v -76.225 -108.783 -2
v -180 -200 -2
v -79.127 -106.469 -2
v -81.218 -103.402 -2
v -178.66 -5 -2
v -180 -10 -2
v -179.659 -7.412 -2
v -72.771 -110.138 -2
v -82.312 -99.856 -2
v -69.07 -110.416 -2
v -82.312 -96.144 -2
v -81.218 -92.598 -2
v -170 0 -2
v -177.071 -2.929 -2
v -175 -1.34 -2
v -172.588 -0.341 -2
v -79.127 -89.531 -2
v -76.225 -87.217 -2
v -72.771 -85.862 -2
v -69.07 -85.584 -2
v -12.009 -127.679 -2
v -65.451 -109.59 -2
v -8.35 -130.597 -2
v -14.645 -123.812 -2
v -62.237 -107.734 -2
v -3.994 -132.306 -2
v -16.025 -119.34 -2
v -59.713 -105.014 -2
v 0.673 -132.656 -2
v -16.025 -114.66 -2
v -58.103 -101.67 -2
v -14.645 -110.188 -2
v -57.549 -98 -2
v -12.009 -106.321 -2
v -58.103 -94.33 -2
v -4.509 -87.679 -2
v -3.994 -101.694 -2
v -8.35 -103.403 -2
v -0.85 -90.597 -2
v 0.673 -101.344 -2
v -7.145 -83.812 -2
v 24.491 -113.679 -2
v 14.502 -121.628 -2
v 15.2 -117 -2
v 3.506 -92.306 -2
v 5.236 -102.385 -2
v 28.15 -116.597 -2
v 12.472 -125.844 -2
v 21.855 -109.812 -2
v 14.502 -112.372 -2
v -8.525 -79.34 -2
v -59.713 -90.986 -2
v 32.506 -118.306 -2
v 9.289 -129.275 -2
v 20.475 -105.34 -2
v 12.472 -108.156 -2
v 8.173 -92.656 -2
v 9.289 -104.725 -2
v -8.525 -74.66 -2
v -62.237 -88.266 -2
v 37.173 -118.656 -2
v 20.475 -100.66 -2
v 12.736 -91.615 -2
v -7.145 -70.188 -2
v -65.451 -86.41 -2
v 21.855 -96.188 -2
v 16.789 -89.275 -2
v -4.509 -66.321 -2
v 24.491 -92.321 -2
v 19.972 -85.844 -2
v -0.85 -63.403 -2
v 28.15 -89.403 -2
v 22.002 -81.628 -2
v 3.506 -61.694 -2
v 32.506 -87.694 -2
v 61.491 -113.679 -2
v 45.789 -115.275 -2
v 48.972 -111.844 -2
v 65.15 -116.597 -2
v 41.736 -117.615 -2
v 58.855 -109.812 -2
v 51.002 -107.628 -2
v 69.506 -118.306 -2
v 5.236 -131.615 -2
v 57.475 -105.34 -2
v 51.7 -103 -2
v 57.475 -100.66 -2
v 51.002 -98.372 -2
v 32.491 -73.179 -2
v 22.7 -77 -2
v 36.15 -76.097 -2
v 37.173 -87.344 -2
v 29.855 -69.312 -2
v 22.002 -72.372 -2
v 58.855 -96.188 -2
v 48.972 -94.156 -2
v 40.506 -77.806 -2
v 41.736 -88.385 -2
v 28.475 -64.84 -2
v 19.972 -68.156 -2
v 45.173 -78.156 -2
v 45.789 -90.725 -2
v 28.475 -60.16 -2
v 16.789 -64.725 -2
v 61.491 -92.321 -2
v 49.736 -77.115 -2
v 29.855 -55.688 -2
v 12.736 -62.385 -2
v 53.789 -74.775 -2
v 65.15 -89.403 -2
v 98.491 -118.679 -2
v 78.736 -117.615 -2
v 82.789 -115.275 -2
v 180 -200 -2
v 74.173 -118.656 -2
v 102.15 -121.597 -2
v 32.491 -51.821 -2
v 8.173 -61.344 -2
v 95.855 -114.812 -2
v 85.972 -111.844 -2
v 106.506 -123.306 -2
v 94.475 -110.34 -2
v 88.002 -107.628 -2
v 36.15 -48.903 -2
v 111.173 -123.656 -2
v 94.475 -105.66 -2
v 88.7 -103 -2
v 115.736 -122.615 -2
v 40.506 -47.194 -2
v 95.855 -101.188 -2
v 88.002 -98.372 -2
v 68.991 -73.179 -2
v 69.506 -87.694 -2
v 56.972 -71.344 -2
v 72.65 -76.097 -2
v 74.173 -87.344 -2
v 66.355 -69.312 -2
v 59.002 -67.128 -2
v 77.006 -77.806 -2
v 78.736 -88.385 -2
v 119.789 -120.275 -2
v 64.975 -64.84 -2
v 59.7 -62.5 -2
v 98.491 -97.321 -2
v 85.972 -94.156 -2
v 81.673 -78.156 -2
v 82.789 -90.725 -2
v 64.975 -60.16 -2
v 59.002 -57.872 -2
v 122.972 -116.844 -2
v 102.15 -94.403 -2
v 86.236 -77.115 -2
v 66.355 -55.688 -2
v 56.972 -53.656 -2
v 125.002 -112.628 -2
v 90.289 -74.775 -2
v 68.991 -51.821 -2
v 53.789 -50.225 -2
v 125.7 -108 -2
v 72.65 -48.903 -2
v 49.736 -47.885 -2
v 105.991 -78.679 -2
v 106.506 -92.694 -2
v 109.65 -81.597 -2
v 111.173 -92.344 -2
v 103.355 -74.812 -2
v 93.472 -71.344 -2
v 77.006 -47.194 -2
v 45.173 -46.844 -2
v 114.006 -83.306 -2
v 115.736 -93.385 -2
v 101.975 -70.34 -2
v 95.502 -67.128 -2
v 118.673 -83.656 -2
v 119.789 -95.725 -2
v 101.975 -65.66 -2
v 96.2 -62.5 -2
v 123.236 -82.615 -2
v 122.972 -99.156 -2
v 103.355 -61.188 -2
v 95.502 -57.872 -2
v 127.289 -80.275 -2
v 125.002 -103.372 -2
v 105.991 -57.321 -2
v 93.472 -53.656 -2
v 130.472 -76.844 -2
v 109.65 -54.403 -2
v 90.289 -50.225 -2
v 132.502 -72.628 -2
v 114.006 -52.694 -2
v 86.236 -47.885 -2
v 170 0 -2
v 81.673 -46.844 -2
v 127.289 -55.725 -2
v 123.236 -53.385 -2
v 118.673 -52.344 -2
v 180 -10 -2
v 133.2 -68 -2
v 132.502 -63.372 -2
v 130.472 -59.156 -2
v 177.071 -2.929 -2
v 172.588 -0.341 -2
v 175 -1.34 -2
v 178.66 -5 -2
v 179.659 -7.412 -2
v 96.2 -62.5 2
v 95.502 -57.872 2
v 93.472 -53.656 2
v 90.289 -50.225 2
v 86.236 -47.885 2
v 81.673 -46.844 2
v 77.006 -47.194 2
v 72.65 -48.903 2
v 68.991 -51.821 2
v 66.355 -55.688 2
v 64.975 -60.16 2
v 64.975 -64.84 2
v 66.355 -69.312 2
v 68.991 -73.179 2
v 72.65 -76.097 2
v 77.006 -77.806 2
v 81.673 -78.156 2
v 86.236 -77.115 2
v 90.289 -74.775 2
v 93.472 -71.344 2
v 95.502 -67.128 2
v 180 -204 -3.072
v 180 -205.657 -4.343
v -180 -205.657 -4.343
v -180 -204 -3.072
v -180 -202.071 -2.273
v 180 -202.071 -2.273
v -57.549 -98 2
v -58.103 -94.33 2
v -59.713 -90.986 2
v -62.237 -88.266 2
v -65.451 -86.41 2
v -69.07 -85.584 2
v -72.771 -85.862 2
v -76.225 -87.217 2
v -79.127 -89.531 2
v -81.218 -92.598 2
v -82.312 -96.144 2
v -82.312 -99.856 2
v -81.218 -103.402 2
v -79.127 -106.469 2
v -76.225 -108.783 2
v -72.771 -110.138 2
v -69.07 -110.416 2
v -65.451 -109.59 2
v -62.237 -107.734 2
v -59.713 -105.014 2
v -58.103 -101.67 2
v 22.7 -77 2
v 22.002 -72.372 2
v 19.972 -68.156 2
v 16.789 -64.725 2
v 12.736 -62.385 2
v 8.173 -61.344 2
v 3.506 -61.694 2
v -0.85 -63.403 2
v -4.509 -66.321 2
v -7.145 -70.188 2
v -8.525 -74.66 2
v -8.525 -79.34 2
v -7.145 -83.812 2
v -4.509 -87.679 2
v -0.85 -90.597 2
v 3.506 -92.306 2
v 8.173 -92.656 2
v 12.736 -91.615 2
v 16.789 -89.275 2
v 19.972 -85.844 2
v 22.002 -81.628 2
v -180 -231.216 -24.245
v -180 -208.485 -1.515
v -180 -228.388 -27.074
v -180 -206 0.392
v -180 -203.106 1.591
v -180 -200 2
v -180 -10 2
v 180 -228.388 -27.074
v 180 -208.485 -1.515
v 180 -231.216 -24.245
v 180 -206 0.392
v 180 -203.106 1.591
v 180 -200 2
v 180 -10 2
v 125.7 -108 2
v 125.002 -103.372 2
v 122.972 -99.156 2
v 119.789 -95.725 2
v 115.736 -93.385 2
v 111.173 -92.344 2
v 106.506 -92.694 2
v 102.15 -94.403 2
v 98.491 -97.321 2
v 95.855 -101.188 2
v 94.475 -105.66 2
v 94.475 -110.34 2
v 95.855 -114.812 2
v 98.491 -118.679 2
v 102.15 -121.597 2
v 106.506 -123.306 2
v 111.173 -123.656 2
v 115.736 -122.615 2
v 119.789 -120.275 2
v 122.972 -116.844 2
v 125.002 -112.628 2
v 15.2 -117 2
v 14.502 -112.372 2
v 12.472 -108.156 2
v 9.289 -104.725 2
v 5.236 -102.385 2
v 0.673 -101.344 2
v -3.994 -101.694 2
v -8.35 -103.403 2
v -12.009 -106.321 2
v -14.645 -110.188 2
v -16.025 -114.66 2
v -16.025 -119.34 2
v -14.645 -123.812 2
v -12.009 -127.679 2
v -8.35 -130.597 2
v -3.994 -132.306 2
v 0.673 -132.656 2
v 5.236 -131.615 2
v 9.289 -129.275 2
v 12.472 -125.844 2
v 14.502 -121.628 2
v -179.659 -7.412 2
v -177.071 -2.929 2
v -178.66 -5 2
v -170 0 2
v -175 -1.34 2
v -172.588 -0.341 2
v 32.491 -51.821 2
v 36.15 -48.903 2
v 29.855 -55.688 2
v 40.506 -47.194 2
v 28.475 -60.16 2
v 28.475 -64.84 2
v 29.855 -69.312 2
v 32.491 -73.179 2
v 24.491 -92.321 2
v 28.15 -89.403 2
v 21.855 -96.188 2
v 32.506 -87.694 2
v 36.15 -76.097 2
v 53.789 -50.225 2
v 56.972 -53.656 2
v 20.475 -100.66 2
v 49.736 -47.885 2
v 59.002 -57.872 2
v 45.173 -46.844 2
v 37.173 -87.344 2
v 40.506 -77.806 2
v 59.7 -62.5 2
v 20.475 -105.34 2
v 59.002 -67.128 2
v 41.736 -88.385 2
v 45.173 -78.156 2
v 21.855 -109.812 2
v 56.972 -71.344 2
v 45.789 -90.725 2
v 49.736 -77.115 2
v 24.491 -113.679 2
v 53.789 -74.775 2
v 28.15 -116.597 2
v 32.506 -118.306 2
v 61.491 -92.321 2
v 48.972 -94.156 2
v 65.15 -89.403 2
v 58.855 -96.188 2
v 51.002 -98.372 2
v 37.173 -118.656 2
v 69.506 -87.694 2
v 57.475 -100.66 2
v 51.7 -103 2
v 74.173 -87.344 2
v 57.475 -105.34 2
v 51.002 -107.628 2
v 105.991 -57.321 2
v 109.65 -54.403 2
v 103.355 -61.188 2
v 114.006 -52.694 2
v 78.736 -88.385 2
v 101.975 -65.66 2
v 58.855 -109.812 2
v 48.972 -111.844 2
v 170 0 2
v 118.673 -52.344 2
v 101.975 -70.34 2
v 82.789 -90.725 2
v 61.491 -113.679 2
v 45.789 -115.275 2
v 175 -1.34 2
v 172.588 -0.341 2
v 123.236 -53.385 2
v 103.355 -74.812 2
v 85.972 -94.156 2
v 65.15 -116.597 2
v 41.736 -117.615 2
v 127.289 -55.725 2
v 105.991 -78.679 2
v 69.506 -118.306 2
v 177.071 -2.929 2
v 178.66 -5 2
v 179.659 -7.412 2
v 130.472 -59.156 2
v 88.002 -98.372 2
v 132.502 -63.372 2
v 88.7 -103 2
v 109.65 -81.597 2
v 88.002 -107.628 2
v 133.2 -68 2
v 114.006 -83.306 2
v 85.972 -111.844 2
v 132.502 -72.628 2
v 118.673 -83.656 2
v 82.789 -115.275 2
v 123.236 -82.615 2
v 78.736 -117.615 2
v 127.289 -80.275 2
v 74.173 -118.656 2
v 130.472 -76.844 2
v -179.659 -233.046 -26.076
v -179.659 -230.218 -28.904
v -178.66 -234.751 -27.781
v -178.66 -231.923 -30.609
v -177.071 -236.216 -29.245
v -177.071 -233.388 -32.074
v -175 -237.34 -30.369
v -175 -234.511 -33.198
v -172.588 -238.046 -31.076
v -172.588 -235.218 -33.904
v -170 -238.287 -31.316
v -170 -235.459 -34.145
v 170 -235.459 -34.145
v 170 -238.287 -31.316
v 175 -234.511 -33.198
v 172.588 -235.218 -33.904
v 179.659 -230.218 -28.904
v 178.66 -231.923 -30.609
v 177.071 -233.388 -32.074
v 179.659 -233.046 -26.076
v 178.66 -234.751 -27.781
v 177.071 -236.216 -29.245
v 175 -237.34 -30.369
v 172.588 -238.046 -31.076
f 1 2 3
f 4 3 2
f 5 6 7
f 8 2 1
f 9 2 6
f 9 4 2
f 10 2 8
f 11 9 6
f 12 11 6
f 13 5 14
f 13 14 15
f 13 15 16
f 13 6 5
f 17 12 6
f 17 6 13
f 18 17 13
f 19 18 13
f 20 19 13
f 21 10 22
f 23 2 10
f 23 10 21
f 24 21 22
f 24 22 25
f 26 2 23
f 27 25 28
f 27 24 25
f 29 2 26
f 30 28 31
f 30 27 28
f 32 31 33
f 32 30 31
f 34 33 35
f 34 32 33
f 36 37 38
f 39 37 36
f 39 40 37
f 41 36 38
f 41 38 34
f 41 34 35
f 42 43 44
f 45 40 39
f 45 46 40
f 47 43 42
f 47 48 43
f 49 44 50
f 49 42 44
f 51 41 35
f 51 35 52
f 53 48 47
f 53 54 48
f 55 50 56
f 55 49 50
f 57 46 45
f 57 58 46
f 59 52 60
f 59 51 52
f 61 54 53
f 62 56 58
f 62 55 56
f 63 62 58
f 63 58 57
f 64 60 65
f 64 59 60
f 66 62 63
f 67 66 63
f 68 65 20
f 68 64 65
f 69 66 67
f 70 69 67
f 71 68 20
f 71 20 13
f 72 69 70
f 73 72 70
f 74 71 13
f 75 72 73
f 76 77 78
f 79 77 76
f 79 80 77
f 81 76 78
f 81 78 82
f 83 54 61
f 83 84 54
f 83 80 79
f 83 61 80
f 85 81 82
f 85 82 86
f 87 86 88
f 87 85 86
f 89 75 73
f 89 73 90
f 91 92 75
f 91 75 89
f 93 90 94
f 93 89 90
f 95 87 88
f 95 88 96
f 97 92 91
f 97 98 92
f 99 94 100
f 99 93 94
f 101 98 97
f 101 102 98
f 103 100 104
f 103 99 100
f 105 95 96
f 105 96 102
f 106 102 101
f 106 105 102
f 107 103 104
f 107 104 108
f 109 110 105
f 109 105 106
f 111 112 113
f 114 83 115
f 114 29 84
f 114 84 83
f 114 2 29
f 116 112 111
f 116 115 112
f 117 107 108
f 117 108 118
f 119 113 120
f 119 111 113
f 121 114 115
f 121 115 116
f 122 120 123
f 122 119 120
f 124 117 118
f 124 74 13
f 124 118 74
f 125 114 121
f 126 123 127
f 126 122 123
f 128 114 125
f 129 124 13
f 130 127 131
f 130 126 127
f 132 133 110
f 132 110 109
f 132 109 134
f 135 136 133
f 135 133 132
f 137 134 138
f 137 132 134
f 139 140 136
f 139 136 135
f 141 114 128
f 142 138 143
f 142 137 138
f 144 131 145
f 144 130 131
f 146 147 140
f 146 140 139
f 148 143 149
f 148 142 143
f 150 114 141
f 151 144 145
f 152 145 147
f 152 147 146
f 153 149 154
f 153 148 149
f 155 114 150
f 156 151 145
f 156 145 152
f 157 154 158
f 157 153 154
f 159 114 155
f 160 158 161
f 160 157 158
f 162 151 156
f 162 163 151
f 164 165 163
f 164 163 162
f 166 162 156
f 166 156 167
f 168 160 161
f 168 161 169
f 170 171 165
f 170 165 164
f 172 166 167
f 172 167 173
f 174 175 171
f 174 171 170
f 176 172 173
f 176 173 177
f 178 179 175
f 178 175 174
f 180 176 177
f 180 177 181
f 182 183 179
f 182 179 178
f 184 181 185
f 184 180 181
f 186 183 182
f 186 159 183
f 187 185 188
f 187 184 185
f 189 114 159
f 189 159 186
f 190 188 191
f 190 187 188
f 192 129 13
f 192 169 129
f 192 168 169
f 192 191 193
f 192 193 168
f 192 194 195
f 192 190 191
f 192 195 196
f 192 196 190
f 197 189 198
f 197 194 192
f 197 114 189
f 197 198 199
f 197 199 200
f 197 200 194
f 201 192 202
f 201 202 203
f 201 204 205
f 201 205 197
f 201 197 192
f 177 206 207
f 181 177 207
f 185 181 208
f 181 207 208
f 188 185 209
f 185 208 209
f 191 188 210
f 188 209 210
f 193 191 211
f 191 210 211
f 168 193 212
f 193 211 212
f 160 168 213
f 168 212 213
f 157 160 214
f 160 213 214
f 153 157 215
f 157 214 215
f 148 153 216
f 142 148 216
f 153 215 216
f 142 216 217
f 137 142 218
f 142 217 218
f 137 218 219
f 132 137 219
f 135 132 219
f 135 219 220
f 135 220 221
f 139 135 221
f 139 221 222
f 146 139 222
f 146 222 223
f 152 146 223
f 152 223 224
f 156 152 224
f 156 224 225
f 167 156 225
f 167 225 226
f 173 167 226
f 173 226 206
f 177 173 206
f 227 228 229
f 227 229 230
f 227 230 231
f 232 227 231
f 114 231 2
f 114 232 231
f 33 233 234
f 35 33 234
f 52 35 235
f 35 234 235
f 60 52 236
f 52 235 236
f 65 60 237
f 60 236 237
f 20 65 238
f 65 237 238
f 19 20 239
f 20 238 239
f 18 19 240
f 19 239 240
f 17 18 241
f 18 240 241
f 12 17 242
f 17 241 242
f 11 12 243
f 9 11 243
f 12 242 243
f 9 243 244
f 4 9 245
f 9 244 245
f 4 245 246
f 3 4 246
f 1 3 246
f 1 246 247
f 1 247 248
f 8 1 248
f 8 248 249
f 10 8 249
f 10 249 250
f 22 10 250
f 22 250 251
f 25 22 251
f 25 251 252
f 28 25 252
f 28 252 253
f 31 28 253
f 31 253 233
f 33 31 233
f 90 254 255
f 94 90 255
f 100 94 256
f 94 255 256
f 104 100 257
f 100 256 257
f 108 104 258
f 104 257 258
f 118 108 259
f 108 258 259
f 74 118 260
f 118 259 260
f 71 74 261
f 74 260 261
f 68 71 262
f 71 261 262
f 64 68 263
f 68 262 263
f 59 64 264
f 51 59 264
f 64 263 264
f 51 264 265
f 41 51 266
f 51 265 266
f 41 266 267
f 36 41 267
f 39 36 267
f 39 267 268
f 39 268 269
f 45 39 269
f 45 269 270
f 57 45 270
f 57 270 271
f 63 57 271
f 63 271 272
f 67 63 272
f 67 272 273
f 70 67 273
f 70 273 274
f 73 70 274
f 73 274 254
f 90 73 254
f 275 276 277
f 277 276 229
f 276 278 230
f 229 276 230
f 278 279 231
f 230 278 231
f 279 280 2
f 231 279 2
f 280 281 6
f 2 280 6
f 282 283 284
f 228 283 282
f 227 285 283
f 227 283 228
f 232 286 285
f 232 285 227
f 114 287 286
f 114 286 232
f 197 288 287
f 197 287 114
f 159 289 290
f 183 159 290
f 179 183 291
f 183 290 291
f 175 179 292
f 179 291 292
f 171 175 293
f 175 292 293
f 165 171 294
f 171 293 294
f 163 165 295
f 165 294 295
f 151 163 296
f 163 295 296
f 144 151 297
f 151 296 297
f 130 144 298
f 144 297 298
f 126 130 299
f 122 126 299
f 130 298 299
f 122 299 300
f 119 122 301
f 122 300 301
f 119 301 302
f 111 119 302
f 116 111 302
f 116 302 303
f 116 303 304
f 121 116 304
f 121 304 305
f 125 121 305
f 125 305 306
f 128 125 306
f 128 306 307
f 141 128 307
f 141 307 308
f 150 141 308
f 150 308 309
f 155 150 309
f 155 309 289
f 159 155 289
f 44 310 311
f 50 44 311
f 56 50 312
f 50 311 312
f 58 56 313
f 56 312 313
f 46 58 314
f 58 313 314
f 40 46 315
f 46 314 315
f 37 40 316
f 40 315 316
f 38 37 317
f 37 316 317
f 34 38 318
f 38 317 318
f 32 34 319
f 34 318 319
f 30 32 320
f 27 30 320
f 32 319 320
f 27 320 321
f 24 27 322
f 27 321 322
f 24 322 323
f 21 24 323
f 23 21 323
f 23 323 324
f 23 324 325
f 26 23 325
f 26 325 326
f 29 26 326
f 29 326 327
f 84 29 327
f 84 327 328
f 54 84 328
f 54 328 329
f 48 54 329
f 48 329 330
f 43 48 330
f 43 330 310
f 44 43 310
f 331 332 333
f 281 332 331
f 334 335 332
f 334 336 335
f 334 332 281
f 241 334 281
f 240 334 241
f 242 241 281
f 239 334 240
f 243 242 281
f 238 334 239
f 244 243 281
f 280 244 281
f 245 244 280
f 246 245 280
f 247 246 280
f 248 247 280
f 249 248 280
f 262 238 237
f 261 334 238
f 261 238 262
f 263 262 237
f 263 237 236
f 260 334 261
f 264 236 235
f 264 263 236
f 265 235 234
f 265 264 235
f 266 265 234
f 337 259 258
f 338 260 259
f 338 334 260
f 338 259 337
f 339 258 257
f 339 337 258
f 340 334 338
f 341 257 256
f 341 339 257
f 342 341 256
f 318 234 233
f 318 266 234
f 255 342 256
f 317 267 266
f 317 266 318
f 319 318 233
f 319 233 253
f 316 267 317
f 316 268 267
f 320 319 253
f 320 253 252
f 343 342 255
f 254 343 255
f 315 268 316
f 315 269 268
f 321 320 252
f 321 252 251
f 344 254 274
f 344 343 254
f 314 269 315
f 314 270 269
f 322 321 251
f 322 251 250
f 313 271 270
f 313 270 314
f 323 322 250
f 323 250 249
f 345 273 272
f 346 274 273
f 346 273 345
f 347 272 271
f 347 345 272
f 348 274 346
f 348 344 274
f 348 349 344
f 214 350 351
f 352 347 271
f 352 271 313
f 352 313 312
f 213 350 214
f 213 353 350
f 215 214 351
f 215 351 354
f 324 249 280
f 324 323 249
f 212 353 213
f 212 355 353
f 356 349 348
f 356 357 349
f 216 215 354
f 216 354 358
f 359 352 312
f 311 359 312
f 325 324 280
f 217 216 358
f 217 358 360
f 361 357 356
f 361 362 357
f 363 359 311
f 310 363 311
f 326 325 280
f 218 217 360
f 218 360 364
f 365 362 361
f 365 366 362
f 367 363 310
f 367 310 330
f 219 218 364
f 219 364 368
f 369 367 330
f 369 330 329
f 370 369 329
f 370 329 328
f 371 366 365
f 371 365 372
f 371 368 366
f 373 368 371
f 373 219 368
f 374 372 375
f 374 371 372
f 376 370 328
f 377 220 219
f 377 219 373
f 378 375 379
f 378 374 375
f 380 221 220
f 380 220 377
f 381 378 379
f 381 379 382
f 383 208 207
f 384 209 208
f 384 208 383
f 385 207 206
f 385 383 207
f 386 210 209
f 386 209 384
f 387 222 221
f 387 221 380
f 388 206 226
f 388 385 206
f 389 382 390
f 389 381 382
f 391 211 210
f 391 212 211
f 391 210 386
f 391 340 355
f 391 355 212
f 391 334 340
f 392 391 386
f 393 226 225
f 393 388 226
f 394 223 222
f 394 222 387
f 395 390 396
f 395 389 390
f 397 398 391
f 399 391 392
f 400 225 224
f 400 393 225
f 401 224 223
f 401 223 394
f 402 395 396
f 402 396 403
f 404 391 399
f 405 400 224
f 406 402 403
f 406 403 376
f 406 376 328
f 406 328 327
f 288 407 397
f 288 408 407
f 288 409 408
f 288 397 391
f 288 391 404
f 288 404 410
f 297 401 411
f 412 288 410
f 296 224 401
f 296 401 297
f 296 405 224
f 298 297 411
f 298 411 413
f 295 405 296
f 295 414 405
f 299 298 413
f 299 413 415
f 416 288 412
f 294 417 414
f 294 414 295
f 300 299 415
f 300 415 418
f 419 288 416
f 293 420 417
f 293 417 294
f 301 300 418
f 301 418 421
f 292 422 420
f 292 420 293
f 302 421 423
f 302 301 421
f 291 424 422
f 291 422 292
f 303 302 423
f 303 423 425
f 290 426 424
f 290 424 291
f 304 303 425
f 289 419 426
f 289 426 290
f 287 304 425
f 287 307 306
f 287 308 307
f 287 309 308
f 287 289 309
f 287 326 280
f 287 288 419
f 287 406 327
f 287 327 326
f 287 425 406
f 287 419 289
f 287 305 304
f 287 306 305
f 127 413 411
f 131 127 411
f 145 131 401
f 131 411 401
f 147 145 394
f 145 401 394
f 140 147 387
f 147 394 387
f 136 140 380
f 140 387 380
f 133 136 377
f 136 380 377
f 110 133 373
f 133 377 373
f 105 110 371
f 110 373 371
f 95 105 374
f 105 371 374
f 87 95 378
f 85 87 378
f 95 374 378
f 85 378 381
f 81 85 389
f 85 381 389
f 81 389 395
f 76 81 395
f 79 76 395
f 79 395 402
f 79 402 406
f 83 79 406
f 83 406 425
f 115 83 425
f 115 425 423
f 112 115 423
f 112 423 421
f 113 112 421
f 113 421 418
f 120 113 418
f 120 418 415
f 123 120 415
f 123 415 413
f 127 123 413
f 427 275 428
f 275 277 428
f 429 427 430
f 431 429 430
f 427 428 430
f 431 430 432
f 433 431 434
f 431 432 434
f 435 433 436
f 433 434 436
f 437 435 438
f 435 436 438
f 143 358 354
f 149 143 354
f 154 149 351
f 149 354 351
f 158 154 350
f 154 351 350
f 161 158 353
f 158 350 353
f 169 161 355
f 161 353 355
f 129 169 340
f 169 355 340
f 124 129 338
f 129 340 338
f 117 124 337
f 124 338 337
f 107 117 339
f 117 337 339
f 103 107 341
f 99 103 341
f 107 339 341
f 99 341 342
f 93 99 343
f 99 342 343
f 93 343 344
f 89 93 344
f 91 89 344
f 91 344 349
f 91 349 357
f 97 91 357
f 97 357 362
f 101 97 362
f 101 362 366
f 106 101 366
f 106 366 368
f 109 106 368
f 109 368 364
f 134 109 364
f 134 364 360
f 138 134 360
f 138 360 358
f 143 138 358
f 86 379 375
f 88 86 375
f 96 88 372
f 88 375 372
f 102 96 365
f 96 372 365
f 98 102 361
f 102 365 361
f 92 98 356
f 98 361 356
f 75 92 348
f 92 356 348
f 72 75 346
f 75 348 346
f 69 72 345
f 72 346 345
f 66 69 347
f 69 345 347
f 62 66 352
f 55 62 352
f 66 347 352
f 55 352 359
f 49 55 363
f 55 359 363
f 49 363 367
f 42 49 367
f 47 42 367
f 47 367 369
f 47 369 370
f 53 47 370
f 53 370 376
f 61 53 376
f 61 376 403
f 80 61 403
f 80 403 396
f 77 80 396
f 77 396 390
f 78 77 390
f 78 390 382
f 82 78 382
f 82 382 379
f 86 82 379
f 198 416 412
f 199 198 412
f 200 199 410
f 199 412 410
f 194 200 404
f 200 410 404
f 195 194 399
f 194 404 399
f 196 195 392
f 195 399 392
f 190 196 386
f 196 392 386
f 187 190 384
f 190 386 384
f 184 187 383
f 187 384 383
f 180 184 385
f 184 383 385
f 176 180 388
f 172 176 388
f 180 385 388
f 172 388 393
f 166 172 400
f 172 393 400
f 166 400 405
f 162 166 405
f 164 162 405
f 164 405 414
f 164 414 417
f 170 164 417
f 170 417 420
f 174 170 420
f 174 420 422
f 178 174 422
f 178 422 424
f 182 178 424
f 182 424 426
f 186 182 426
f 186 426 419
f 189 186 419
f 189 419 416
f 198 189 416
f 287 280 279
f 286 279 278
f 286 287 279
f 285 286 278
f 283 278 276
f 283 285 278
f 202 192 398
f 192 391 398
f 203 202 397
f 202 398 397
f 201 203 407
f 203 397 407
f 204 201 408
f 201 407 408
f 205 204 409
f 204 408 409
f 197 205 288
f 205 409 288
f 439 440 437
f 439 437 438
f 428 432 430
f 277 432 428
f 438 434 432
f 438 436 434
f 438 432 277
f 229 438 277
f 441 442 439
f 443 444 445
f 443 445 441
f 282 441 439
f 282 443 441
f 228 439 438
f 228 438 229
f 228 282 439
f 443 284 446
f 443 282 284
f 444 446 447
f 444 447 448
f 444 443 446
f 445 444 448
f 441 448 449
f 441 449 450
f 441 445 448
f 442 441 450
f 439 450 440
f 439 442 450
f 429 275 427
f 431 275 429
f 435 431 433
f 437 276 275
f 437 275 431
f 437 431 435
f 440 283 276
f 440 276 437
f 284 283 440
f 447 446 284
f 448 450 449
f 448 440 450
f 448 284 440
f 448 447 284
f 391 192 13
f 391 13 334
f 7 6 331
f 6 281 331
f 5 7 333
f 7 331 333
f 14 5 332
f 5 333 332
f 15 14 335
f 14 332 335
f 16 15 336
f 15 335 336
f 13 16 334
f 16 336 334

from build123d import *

# Parameters (mm, degrees)
SALIENTE_EXTRUIR1_DEPTH = 180
CROQUIS3_R              = 12.450594948
CROQUIS3_R_2            = 15.7
CORTAR_EXTRUIR1_DEPTH   = 37.14486815
REDONDEO1_R             = 10


with BuildPart() as part:
    # Croquis1 → Saliente-Extruir1 (new body, symmetric)
    with BuildSketch(Plane(origin=(0, 0, 0), x_dir=(0, 0, -1), z_dir=(1, 0, 0))):
        with BuildLine():
            Line((-2, 0), (-2, -200))
            ThreePointArc((-2, -200), (-1.08655439, -204.592201188), (1.514718626, -208.485281374))
            Line((1.514718626, -208.485281374), (31.316441026, -238.287003774))
            Line((31.316441026, -238.287003774), (34.14486815, -235.458576649))
            Line((34.14486815, -235.458576649), (4.343145751, -205.656854249))
            ThreePointArc((4.343145751, -205.656854249), (2.60896374, -203.061467459), (2, -200))
            Line((2, -200), (2, 0))
            Line((2, 0), (-2, 0))
        make_face()
    extrude(amount=SALIENTE_EXTRUIR1_DEPTH, both=True)

    # Croquis3 → Cortar-Extruir1 (cut, through all)
    with BuildSketch(Plane.XY.offset(2)):
        with Locations((-70, -98)):
            Circle(CROQUIS3_R)
        with Locations((7, -77)):
            Circle(CROQUIS3_R_2)
        with Locations((-0.5, -117)):
            Circle(CROQUIS3_R_2)
        with Locations((36, -103)):
            Circle(CROQUIS3_R_2)
        with Locations((73, -103)):
            Circle(CROQUIS3_R_2)
        with Locations((110, -108)):
            Circle(CROQUIS3_R_2)
        with Locations((117.5, -68)):
            Circle(CROQUIS3_R_2)
        with Locations((80.5, -62.5)):
            Circle(CROQUIS3_R_2)
        with Locations((44, -62.5)):
            Circle(CROQUIS3_R_2)
    extrude(amount=-CORTAR_EXTRUIR1_DEPTH, mode=Mode.SUBTRACT)

    # Redondeo1
    redondeo1_edges = [part.edges().sort_by_distance(p)[0] for p in [
        (-180, 0, 0),
        (180, -236.872790212, -32.730654588),
        (180, 0, 0),
        (-180, -236.872790212, -32.730654588),
    ]]
    fillet(redondeo1_edges, radius=REDONDEO1_R)


solid = part.part
